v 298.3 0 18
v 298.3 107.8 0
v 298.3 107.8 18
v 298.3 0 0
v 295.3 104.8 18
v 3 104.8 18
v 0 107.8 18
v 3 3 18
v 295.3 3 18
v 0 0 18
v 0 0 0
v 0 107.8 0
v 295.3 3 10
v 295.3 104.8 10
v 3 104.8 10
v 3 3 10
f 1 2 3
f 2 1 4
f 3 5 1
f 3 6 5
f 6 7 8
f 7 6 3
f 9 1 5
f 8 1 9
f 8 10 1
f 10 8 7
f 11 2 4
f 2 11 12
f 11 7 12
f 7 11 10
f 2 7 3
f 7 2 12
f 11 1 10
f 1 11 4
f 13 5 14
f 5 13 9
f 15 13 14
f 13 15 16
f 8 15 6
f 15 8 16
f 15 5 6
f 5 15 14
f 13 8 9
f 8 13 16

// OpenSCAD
// Generated keyboard case
// Layout: 5x15
// Switch type: Cherry MX
// Optimization: surface

// Parameters
case_width = 298.30;
case_height = 107.80;
case_depth = 18.00;
wall_thickness = 3.00;
base_height = 10.00;
switch_cutout_size = 14.00;
key_spacing = 19.05;

module keyboard_case() {
    difference() {
        // Outer shell
        translate([0, 0, 0])
            cube([case_width, case_height, case_depth]);

        // Inner cavity
        translate([wall_thickness, wall_thickness, base_height])
            cube([case_width - 2*wall_thickness, 
                  case_height - 2*wall_thickness, 
                  case_depth - base_height + 1]);

        // Switch cutouts
        translate([wall_thickness + 5 - 0.00, wall_thickness + 5 - 0.00, -1])
            surface() switch_plate();
    }
}

module switch_plate() {
    translate([0.00, 0.00, 0])
        cube([switch_cutout_size, switch_cutout_size, base_height + 2]);
    translate([19.05, 0.00, 0])
        cube([switch_cutout_size, switch_cutout_size, base_height + 2]);
    translate([38.10, 0.00, 0])
        cube([switch_cutout_size, switch_cutout_size, base_height + 2]);
    translate([57.15, 0.00, 0])
        cube([switch_cutout_size, switch_cutout_size, base_height + 2]);
    translate([76.20, 0.00, 0])
        cube([switch_cutout_size, switch_cutout_size, base_height + 2]);
    translate([95.25, 0.00, 0])
        cube([switch_cutout_size, switch_cutout_size, base_height + 2]);
    translate([114.30, 0.00, 0])
        cube([switch_cutout_size, switch_cutout_size, base_height + 2]);
    translate([133.35, 0.00, 0])
        cube([switch_cutout_size, switch_cutout_size, base_height + 2]);
    translate([152.40, 0.00, 0])
        cube([switch_cutout_size, switch_cutout_size, base_height + 2]);
    translate([171.45, 0.00, 0])
        cube([switch_cutout_size, switch_cutout_size, base_height + 2]);
    translate([190.50, 0.00, 0])
        cube([switch_cutout_size, switch_cutout_size, base_height + 2]);
    translate([209.55, 0.00, 0])
        cube([switch_cutout_size, switch_cutout_size, base_height + 2]);
    translate([228.60, 0.00, 0])
        cube([switch_cutout_size, switch_cutout_size, base_height + 2]);
    translate([247.65, 0.00, 0])
        cube([switch_cutout_size, switch_cutout_size, base_height + 2]);
    translate([266.70, 0.00, 0])
        cube([switch_cutout_size, switch_cutout_size, base_height + 2]);
    translate([0.00, 19.05, 0])
        cube([switch_cutout_size, switch_cutout_size, base_height + 2]);
    translate([19.05, 19.05, 0])
        cube([switch_cutout_size, switch_cutout_size, base_height + 2]);
    translate([38.10, 19.05, 0])
        cube([switch_cutout_size, switch_cutout_size, base_height + 2]);
    translate([57.15, 19.05, 0])
        cube([switch_cutout_size, switch_cutout_size, base_height + 2]);
    translate([76.20, 19.05, 0])
        cube([switch_cutout_size, switch_cutout_size, base_height + 2]);
    translate([95.25, 19.05, 0])
        cube([switch_cutout_size, switch_cutout_size, base_height + 2]);
    translate([114.30, 19.05, 0])
        cube([switch_cutout_size, switch_cutout_size, base_height + 2]);
    translate([133.35, 19.05, 0])
        cube([switch_cutout_size, switch_cutout_size, base_height + 2]);
    translate([152.40, 19.05, 0])
        cube([switch_cutout_size, switch_cutout_size, base_height + 2]);
    translate([171.45, 19.05, 0])
        cube([switch_cutout_size, switch_cutout_size, base_height + 2]);
    translate([190.50, 19.05, 0])
        cube([switch_cutout_size, switch_cutout_size, base_height + 2]);
    translate([209.55, 19.05, 0])
        cube([switch_cutout_size, switch_cutout_size, base_height + 2]);
    translate([228.60, 19.05, 0])
        cube([switch_cutout_size, switch_cutout_size, base_height + 2]);
    translate([247.65, 19.05, 0])
        cube([switch_cutout_size, switch_cutout_size, base_height + 2]);
    translate([266.70, 19.05, 0])
        cube([switch_cutout_size, switch_cutout_size, base_height + 2]);
    translate([0.00, 38.10, 0])
        cube([switch_cutout_size, switch_cutout_size, base_height + 2]);
    translate([19.05, 38.10, 0])
        cube([switch_cutout_size, switch_cutout_size, base_height + 2]);
    translate([38.10, 38.10, 0])
        cube([switch_cutout_size, switch_cutout_size, base_height + 2]);
    translate([57.15, 38.10, 0])
        cube([switch_cutout_size, switch_cutout_size, base_height + 2]);
    translate([76.20, 38.10, 0])
        cube([switch_cutout_size, switch_cutout_size, base_height + 2]);
    translate([95.25, 38.10, 0])
        cube([switch_cutout_size, switch_cutout_size, base_height + 2]);
    translate([114.30, 38.10, 0])
        cube([switch_cutout_size, switch_cutout_size, base_height + 2]);
    translate([133.35, 38.10, 0])
        cube([switch_cutout_size, switch_cutout_size, base_height + 2]);
    translate([152.40, 38.10, 0])
        cube([switch_cutout_size, switch_cutout_size, base_height + 2]);
    translate([171.45, 38.10, 0])
        cube([switch_cutout_size, switch_cutout_size, base_height + 2]);
    translate([190.50, 38.10, 0])
        cube([switch_cutout_size, switch_cutout_size, base_height + 2]);
    translate([209.55, 38.10, 0])
        cube([switch_cutout_size, switch_cutout_size, base_height + 2]);
    translate([228.60, 38.10, 0])
        cube([switch_cutout_size, switch_cutout_size, base_height + 2]);
    translate([247.65, 38.10, 0])
        cube([switch_cutout_size, switch_cutout_size, base_height + 2]);
    translate([266.70, 38.10, 0])
        cube([switch_cutout_size, switch_cutout_size, base_height + 2]);
    translate([0.00, 57.15, 0])
        cube([switch_cutout_size, switch_cutout_size, base_height + 2]);
    translate([19.05, 57.15, 0])
        cube([switch_cutout_size, switch_cutout_size, base_height + 2]);
    translate([38.10, 57.15, 0])
        cube([switch_cutout_size, switch_cutout_size, base_height + 2]);
    translate([57.15, 57.15, 0])
        cube([switch_cutout_size, switch_cutout_size, base_height + 2]);
    translate([76.20, 57.15, 0])
        cube([switch_cutout_size, switch_cutout_size, base_height + 2]);
    translate([95.25, 57.15, 0])
        cube([switch_cutout_size, switch_cutout_size, base_height + 2]);
    translate([114.30, 57.15, 0])
        cube([switch_cutout_size, switch_cutout_size, base_height + 2]);
    translate([133.35, 57.15, 0])
        cube([switch_cutout_size, switch_cutout_size, base_height + 2]);
    translate([152.40, 57.15, 0])
        cube([switch_cutout_size, switch_cutout_size, base_height + 2]);
    translate([171.45, 57.15, 0])
        cube([switch_cutout_size, switch_cutout_size, base_height + 2]);
    translate([190.50, 57.15, 0])
        cube([switch_cutout_size, switch_cutout_size, base_height + 2]);
    translate([209.55, 57.15, 0])
        cube([switch_cutout_size, switch_cutout_size, base_height + 2]);
    translate([228.60, 57.15, 0])
        cube([switch_cutout_size, switch_cutout_size, base_height + 2]);
    translate([247.65, 57.15, 0])
        cube([switch_cutout_size, switch_cutout_size, base_height + 2]);
    translate([266.70, 57.15, 0])
        cube([switch_cutout_size, switch_cutout_size, base_height + 2]);
    translate([0.00, 76.20, 0])
        cube([switch_cutout_size, switch_cutout_size, base_height + 2]);
    translate([19.05, 76.20, 0])
        cube([switch_cutout_size, switch_cutout_size, base_height + 2]);
    translate([38.10, 76.20, 0])
        cube([switch_cutout_size, switch_cutout_size, base_height + 2]);
    translate([57.15, 76.20, 0])
        cube([switch_cutout_size, switch_cutout_size, base_height + 2]);
    translate([76.20, 76.20, 0])
        cube([switch_cutout_size, switch_cutout_size, base_height + 2]);
    translate([95.25, 76.20, 0])
        cube([switch_cutout_size, switch_cutout_size, base_height + 2]);
    translate([114.30, 76.20, 0])
        cube([switch_cutout_size, switch_cutout_size, base_height + 2]);
    translate([133.35, 76.20, 0])
        cube([switch_cutout_size, switch_cutout_size, base_height + 2]);
    translate([152.40, 76.20, 0])
        cube([switch_cutout_size, switch_cutout_size, base_height + 2]);
    translate([171.45, 76.20, 0])
        cube([switch_cutout_size, switch_cutout_size, base_height + 2]);
    translate([190.50, 76.20, 0])
        cube([switch_cutout_size, switch_cutout_size, base_height + 2]);
    translate([209.55, 76.20, 0])
        cube([switch_cutout_size, switch_cutout_size, base_height + 2]);
    translate([228.60, 76.20, 0])
        cube([switch_cutout_size, switch_cutout_size, base_height + 2]);
    translate([247.65, 76.20, 0])
        cube([switch_cutout_size, switch_cutout_size, base_height + 2]);
    translate([266.70, 76.20, 0])
        cube([switch_cutout_size, switch_cutout_size, base_height + 2]);
}

// Generate the case
keyboard_case();
